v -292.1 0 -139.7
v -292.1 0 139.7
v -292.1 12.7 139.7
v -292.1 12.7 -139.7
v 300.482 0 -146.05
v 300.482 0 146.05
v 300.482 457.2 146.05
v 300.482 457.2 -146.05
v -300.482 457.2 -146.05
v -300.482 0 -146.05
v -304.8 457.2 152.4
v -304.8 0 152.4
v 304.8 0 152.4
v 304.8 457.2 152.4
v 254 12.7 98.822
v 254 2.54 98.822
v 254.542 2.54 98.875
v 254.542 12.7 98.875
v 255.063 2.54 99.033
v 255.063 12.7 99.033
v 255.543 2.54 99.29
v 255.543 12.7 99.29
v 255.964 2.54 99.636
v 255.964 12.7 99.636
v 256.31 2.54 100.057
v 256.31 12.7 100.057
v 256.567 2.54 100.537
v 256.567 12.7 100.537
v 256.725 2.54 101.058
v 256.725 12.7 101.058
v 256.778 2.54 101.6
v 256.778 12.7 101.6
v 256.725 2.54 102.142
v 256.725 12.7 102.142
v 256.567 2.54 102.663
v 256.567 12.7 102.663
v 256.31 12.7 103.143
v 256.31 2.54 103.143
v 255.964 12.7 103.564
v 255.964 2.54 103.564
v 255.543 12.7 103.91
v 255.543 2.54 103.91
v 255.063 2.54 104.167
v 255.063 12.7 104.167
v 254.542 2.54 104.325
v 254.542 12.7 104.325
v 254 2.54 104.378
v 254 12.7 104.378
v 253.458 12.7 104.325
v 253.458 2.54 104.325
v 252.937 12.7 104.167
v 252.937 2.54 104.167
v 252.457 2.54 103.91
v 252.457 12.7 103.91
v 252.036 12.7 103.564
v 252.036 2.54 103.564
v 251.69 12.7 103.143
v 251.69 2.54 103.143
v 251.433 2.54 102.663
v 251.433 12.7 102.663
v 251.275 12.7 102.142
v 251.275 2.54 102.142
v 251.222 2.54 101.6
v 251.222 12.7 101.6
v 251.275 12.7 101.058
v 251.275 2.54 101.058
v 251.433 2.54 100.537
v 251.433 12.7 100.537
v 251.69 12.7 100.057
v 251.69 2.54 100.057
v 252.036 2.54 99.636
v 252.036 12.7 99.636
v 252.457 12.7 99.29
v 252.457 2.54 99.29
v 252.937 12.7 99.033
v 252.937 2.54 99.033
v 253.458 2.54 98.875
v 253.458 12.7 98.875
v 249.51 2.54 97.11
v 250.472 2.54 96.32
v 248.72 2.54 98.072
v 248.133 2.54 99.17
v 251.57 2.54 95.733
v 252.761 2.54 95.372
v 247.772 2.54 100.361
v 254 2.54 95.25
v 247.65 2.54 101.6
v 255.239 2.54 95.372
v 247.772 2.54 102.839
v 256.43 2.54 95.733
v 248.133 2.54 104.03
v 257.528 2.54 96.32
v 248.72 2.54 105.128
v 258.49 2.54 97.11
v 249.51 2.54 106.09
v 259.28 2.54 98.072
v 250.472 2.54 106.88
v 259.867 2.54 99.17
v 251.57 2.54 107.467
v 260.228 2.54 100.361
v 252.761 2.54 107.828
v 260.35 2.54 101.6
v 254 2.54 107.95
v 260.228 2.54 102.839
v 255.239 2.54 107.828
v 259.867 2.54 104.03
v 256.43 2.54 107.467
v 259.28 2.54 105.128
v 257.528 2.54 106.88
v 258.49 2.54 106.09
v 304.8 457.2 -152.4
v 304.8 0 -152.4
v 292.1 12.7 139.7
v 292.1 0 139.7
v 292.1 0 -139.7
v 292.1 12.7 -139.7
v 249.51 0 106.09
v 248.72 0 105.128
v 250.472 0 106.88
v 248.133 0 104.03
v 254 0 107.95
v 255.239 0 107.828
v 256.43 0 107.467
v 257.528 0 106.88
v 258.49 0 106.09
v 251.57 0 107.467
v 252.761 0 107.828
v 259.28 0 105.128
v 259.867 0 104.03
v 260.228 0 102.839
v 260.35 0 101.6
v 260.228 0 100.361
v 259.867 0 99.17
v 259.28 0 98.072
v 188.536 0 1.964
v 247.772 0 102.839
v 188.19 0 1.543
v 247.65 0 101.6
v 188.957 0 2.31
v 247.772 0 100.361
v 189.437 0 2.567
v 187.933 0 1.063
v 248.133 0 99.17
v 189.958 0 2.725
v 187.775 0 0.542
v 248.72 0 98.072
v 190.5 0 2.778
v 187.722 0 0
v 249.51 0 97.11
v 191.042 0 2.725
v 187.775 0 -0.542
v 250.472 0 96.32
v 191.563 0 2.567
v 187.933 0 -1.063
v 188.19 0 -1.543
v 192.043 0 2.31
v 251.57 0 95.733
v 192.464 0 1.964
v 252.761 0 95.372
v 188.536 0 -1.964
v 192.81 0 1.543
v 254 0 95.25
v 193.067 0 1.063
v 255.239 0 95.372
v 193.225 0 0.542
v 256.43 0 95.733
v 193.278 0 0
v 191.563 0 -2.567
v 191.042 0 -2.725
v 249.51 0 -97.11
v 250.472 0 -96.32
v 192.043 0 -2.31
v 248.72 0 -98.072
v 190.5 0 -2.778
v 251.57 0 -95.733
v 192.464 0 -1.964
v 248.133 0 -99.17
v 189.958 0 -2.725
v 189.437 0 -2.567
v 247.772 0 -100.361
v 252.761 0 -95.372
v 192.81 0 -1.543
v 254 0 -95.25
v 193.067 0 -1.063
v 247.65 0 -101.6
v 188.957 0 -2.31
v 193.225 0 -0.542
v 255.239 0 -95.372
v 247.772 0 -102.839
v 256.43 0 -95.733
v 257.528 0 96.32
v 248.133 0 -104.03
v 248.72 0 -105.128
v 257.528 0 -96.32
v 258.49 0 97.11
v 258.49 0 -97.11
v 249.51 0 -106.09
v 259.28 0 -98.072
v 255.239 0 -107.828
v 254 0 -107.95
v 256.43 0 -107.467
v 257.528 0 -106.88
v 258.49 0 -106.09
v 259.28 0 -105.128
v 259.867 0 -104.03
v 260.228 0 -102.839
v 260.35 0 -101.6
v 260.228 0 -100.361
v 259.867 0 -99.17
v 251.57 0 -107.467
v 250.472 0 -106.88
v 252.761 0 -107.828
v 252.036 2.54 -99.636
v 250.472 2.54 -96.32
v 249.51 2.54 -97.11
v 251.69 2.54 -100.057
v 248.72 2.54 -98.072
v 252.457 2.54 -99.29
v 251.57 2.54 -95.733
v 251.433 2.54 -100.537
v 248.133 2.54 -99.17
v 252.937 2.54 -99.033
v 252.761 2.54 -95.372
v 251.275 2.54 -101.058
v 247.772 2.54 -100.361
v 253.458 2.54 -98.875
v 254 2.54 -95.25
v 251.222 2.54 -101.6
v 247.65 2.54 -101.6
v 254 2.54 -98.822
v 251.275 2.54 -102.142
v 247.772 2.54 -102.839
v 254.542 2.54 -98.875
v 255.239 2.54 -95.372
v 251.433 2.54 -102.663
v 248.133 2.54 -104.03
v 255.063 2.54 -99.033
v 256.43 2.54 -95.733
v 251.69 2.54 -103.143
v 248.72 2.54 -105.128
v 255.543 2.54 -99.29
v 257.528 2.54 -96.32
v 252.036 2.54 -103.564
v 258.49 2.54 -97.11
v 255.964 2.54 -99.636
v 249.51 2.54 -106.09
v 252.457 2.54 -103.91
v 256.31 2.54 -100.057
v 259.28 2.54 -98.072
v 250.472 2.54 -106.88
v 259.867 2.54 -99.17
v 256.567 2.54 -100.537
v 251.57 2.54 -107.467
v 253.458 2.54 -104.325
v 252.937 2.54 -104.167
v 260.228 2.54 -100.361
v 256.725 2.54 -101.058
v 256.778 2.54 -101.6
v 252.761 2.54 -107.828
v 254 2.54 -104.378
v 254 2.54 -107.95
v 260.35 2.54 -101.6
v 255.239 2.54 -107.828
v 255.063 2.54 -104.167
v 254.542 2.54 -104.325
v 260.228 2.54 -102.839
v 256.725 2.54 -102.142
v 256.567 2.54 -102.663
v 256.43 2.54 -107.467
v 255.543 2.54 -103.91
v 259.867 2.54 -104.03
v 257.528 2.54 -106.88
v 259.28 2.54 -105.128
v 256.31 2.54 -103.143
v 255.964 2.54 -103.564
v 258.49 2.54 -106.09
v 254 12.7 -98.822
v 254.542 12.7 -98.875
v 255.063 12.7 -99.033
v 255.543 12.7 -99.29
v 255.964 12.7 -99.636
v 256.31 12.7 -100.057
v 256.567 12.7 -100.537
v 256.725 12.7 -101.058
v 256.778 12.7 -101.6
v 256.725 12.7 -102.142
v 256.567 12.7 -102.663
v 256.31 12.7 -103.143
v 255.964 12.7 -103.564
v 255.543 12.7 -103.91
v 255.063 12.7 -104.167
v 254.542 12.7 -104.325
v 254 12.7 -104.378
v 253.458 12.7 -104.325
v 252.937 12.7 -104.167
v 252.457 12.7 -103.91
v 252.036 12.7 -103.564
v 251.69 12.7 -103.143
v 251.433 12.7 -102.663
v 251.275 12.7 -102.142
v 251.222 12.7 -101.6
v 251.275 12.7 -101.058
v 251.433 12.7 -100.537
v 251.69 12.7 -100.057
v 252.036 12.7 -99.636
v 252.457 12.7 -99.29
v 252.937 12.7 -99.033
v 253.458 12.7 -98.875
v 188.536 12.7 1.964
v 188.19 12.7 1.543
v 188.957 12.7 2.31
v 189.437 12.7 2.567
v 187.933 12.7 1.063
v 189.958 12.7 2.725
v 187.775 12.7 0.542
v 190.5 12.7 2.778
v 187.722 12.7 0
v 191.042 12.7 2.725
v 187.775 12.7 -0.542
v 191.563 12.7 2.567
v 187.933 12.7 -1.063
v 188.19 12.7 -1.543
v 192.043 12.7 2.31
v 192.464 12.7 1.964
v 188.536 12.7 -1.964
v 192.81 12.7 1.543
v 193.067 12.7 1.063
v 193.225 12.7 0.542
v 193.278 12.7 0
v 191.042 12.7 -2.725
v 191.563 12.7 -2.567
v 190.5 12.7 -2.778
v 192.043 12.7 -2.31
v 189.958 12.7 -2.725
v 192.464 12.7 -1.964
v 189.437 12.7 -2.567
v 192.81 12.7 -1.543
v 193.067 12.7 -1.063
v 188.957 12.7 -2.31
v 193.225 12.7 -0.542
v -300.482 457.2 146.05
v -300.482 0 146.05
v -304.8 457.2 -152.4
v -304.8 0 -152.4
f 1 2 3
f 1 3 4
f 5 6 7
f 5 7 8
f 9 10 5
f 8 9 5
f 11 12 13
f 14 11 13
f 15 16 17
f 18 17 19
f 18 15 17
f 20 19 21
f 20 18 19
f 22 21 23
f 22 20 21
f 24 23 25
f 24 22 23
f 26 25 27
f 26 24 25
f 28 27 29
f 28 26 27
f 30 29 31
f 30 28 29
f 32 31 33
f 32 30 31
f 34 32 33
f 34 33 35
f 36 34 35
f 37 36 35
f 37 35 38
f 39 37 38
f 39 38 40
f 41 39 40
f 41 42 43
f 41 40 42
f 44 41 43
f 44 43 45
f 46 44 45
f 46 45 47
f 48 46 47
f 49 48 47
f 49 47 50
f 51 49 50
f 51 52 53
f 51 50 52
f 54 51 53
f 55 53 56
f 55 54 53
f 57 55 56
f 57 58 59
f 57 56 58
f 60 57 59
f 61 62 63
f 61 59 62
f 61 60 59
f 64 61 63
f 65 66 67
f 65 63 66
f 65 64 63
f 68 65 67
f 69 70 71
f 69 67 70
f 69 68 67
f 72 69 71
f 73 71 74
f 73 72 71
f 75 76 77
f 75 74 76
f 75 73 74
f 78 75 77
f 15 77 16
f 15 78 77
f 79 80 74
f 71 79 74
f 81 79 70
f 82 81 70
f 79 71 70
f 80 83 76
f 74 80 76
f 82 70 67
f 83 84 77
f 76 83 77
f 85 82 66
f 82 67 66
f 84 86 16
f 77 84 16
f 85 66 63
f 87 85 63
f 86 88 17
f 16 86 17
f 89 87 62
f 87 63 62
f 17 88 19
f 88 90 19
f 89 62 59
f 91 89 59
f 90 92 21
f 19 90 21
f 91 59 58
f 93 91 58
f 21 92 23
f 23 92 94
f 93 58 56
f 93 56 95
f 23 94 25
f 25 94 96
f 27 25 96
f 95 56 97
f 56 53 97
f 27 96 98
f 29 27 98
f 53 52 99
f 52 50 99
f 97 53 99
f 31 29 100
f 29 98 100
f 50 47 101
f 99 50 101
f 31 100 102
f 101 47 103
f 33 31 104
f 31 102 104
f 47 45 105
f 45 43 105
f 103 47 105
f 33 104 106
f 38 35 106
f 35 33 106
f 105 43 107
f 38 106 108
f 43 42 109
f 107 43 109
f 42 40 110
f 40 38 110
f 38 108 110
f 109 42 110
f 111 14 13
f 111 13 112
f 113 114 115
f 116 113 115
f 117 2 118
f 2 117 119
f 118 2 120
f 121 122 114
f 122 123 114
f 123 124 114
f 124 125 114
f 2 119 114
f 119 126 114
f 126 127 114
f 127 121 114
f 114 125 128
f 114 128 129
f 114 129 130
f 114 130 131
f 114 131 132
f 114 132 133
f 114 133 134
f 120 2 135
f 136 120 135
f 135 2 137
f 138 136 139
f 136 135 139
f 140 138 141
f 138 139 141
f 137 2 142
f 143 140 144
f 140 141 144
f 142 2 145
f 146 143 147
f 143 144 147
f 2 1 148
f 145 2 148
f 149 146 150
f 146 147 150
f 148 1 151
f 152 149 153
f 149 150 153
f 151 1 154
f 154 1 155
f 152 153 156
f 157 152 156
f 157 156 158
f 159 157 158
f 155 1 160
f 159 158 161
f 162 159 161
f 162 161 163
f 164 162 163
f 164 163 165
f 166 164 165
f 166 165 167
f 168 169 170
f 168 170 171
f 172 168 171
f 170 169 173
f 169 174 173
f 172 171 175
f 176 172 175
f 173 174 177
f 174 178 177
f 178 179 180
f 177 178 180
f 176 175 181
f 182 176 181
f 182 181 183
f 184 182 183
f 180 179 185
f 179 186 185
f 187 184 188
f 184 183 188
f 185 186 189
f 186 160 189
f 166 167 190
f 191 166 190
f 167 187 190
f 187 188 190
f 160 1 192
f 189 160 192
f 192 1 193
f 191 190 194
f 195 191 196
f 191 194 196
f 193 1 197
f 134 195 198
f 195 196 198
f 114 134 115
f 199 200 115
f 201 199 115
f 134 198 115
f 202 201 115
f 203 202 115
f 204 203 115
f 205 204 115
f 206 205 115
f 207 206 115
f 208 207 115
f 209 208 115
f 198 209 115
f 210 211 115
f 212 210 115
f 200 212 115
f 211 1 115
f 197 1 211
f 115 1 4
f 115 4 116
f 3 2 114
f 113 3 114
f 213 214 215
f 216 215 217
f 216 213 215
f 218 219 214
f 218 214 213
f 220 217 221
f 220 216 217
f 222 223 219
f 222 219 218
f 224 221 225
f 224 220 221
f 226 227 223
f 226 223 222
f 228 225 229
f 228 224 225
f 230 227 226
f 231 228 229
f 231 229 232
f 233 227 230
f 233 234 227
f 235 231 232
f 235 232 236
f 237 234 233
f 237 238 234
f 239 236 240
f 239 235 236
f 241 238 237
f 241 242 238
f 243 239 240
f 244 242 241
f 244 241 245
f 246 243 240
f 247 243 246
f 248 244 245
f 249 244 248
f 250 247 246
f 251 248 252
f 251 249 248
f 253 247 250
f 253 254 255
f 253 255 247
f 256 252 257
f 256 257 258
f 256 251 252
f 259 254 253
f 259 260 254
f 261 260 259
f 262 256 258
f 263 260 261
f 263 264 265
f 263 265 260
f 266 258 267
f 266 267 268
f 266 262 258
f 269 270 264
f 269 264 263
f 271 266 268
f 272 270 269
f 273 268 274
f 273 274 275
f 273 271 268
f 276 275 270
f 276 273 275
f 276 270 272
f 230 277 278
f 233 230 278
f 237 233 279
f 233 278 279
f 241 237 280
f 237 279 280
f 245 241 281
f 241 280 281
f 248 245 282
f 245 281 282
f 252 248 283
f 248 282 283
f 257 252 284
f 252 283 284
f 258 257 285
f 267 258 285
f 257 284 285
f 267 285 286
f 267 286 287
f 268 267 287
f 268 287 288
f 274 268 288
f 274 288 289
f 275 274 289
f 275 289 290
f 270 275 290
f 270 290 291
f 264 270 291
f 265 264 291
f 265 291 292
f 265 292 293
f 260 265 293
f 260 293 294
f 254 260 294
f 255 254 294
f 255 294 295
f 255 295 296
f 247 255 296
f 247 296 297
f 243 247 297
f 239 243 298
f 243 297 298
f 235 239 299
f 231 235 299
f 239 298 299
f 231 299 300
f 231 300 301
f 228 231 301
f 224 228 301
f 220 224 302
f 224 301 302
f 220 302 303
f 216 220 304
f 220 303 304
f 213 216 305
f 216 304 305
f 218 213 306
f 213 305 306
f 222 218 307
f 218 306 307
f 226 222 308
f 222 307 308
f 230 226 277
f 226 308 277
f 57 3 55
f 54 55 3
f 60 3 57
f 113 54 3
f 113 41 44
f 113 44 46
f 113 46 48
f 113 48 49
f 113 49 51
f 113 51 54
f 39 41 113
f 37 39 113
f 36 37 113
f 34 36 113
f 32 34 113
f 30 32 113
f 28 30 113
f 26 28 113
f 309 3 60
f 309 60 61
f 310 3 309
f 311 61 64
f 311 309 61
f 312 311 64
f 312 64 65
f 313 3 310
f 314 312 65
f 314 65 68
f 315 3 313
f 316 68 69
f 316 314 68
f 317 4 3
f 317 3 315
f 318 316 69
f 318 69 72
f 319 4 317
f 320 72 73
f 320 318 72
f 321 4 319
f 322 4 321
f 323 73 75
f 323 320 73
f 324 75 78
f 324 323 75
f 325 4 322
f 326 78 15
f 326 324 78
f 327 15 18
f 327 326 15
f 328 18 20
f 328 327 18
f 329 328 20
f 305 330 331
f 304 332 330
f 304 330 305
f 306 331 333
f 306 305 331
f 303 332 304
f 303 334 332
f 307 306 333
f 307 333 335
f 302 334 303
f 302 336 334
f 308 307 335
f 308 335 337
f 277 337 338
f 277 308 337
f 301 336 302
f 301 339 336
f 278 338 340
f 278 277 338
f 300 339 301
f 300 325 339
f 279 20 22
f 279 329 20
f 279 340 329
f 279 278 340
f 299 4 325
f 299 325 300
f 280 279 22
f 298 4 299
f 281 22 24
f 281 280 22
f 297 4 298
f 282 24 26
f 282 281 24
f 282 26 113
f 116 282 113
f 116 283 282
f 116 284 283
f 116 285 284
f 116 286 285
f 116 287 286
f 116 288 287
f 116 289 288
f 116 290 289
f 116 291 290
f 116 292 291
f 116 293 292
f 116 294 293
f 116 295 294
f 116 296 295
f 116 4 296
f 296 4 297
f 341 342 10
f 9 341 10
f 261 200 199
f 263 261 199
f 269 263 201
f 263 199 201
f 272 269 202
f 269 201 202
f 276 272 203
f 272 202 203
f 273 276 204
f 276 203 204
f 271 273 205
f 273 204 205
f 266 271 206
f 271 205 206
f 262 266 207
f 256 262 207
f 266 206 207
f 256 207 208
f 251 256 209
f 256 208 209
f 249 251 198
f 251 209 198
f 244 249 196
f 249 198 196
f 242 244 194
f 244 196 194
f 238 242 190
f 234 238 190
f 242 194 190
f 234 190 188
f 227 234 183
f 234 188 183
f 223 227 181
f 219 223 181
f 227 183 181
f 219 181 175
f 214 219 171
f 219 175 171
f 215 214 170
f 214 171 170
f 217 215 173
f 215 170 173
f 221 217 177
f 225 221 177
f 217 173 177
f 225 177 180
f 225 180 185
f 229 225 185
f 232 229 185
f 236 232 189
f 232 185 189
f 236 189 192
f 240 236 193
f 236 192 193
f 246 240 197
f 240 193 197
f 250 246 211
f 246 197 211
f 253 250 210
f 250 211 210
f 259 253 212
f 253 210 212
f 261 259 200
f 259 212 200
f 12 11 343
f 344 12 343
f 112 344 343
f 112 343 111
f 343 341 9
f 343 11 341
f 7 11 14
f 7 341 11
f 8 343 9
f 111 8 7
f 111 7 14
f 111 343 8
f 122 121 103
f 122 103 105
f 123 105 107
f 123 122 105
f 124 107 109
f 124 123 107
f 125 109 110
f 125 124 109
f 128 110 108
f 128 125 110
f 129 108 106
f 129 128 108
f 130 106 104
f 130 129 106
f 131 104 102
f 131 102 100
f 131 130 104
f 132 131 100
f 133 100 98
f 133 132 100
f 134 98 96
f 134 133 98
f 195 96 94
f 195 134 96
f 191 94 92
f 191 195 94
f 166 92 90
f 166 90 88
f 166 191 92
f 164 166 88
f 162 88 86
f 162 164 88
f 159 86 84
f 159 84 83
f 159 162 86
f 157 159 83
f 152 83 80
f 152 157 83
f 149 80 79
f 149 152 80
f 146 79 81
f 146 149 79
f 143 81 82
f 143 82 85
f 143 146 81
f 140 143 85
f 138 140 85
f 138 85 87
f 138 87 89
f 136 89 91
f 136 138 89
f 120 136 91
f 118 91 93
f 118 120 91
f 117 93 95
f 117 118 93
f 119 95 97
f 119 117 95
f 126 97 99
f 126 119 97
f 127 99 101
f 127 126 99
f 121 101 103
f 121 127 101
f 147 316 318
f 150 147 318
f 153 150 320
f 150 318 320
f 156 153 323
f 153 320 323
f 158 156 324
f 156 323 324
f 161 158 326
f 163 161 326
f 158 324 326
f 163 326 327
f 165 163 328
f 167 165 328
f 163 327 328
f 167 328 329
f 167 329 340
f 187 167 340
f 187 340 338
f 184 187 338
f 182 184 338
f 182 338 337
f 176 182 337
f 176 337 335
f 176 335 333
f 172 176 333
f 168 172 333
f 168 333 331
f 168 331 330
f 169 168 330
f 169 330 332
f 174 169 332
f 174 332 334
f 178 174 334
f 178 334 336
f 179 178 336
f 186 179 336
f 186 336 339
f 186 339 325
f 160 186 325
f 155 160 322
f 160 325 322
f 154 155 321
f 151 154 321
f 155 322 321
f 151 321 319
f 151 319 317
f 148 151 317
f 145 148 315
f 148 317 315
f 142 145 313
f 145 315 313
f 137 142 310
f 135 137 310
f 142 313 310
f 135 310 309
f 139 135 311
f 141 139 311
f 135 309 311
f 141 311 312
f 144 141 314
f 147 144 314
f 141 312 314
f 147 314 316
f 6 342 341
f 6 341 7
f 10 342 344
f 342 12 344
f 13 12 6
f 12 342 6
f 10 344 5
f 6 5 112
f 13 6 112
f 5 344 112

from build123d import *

# Parameters (mm, degrees)
SKETCH1_W           = 584.2
SKETCH1_H           = 279.4
BOSS_EXTRUDE1_DEPTH = 12.7
SKETCH3_W           = 609.6
SKETCH3_H           = 304.8
SKETCH3_W_2         = 600.964
SKETCH3_H_2         = 292.1
BOSS_EXTRUDE3_DEPTH = 457.2
SKETCH4_R           = 2.778125
CUT_EXTRUDE1_DEPTH  = 561.097357608
SKETCH6_R           = 6.35
CUT_EXTRUDE2_DEPTH  = 2.54
SKETCH7_R           = 2.778125
CUT_EXTRUDE3_DEPTH  = 561.097357608


with BuildPart() as part:
    # Sketch1 → Boss-Extrude1 (new body)
    with BuildSketch(Plane(origin=(0, 0, 0), x_dir=(1, 0, 0), z_dir=(0, 1, 0))):
        Rectangle(SKETCH1_W, SKETCH1_H)
    extrude(amount=BOSS_EXTRUDE1_DEPTH)

    # Sketch4 → Cut-Extrude1 (cut, through all)
    with BuildSketch(Plane(origin=(0, 12.7, 0), x_dir=(1, 0, 0), z_dir=(0, 1, 0))):
        with Locations(Location((254, 101.6, 0), (0, 0, 270))):
            Circle(SKETCH4_R)
    cut_extrude1 = extrude(amount=-CUT_EXTRUDE1_DEPTH, mode=Mode.SUBTRACT)

    # Sketch6 → Cut-Extrude2 (cut)
    with BuildSketch(Plane.XZ):
        with Locations(Location((254, -101.6, 0), (0, 0, 270))):
            Circle(SKETCH6_R)
    cut_extrude2 = extrude(amount=-CUT_EXTRUDE2_DEPTH, mode=Mode.SUBTRACT)

    # Mirror1: Cut-Extrude1, Cut-Extrude2 across plane
    add(cut_extrude1.mirror(Plane.XY), mode=Mode.SUBTRACT)
    add(cut_extrude2.mirror(Plane.XY), mode=Mode.SUBTRACT)

    # Sketch7 → Cut-Extrude3 (cut, through all)
    with BuildSketch(Plane(origin=(0, 12.7, 0), x_dir=(1, 0, 0), z_dir=(0, 1, 0))):
        with Locations(Location((190.5, 0, 0), (0, 0, 270))):
            Circle(SKETCH7_R)
    extrude(amount=-CUT_EXTRUDE3_DEPTH, mode=Mode.SUBTRACT)


with BuildPart() as body_2:
    # Sketch3 → Boss-Extrude3 (new body)
    with BuildSketch(Plane(origin=(0, 0, 0), x_dir=(1, 0, 0), z_dir=(0, 1, 0))):
        Rectangle(SKETCH3_W, SKETCH3_H)
        Rectangle(SKETCH3_W_2, SKETCH3_H_2, mode=Mode.SUBTRACT)
    extrude(amount=BOSS_EXTRUDE3_DEPTH)


solid = Compound([part.part, body_2.part])
